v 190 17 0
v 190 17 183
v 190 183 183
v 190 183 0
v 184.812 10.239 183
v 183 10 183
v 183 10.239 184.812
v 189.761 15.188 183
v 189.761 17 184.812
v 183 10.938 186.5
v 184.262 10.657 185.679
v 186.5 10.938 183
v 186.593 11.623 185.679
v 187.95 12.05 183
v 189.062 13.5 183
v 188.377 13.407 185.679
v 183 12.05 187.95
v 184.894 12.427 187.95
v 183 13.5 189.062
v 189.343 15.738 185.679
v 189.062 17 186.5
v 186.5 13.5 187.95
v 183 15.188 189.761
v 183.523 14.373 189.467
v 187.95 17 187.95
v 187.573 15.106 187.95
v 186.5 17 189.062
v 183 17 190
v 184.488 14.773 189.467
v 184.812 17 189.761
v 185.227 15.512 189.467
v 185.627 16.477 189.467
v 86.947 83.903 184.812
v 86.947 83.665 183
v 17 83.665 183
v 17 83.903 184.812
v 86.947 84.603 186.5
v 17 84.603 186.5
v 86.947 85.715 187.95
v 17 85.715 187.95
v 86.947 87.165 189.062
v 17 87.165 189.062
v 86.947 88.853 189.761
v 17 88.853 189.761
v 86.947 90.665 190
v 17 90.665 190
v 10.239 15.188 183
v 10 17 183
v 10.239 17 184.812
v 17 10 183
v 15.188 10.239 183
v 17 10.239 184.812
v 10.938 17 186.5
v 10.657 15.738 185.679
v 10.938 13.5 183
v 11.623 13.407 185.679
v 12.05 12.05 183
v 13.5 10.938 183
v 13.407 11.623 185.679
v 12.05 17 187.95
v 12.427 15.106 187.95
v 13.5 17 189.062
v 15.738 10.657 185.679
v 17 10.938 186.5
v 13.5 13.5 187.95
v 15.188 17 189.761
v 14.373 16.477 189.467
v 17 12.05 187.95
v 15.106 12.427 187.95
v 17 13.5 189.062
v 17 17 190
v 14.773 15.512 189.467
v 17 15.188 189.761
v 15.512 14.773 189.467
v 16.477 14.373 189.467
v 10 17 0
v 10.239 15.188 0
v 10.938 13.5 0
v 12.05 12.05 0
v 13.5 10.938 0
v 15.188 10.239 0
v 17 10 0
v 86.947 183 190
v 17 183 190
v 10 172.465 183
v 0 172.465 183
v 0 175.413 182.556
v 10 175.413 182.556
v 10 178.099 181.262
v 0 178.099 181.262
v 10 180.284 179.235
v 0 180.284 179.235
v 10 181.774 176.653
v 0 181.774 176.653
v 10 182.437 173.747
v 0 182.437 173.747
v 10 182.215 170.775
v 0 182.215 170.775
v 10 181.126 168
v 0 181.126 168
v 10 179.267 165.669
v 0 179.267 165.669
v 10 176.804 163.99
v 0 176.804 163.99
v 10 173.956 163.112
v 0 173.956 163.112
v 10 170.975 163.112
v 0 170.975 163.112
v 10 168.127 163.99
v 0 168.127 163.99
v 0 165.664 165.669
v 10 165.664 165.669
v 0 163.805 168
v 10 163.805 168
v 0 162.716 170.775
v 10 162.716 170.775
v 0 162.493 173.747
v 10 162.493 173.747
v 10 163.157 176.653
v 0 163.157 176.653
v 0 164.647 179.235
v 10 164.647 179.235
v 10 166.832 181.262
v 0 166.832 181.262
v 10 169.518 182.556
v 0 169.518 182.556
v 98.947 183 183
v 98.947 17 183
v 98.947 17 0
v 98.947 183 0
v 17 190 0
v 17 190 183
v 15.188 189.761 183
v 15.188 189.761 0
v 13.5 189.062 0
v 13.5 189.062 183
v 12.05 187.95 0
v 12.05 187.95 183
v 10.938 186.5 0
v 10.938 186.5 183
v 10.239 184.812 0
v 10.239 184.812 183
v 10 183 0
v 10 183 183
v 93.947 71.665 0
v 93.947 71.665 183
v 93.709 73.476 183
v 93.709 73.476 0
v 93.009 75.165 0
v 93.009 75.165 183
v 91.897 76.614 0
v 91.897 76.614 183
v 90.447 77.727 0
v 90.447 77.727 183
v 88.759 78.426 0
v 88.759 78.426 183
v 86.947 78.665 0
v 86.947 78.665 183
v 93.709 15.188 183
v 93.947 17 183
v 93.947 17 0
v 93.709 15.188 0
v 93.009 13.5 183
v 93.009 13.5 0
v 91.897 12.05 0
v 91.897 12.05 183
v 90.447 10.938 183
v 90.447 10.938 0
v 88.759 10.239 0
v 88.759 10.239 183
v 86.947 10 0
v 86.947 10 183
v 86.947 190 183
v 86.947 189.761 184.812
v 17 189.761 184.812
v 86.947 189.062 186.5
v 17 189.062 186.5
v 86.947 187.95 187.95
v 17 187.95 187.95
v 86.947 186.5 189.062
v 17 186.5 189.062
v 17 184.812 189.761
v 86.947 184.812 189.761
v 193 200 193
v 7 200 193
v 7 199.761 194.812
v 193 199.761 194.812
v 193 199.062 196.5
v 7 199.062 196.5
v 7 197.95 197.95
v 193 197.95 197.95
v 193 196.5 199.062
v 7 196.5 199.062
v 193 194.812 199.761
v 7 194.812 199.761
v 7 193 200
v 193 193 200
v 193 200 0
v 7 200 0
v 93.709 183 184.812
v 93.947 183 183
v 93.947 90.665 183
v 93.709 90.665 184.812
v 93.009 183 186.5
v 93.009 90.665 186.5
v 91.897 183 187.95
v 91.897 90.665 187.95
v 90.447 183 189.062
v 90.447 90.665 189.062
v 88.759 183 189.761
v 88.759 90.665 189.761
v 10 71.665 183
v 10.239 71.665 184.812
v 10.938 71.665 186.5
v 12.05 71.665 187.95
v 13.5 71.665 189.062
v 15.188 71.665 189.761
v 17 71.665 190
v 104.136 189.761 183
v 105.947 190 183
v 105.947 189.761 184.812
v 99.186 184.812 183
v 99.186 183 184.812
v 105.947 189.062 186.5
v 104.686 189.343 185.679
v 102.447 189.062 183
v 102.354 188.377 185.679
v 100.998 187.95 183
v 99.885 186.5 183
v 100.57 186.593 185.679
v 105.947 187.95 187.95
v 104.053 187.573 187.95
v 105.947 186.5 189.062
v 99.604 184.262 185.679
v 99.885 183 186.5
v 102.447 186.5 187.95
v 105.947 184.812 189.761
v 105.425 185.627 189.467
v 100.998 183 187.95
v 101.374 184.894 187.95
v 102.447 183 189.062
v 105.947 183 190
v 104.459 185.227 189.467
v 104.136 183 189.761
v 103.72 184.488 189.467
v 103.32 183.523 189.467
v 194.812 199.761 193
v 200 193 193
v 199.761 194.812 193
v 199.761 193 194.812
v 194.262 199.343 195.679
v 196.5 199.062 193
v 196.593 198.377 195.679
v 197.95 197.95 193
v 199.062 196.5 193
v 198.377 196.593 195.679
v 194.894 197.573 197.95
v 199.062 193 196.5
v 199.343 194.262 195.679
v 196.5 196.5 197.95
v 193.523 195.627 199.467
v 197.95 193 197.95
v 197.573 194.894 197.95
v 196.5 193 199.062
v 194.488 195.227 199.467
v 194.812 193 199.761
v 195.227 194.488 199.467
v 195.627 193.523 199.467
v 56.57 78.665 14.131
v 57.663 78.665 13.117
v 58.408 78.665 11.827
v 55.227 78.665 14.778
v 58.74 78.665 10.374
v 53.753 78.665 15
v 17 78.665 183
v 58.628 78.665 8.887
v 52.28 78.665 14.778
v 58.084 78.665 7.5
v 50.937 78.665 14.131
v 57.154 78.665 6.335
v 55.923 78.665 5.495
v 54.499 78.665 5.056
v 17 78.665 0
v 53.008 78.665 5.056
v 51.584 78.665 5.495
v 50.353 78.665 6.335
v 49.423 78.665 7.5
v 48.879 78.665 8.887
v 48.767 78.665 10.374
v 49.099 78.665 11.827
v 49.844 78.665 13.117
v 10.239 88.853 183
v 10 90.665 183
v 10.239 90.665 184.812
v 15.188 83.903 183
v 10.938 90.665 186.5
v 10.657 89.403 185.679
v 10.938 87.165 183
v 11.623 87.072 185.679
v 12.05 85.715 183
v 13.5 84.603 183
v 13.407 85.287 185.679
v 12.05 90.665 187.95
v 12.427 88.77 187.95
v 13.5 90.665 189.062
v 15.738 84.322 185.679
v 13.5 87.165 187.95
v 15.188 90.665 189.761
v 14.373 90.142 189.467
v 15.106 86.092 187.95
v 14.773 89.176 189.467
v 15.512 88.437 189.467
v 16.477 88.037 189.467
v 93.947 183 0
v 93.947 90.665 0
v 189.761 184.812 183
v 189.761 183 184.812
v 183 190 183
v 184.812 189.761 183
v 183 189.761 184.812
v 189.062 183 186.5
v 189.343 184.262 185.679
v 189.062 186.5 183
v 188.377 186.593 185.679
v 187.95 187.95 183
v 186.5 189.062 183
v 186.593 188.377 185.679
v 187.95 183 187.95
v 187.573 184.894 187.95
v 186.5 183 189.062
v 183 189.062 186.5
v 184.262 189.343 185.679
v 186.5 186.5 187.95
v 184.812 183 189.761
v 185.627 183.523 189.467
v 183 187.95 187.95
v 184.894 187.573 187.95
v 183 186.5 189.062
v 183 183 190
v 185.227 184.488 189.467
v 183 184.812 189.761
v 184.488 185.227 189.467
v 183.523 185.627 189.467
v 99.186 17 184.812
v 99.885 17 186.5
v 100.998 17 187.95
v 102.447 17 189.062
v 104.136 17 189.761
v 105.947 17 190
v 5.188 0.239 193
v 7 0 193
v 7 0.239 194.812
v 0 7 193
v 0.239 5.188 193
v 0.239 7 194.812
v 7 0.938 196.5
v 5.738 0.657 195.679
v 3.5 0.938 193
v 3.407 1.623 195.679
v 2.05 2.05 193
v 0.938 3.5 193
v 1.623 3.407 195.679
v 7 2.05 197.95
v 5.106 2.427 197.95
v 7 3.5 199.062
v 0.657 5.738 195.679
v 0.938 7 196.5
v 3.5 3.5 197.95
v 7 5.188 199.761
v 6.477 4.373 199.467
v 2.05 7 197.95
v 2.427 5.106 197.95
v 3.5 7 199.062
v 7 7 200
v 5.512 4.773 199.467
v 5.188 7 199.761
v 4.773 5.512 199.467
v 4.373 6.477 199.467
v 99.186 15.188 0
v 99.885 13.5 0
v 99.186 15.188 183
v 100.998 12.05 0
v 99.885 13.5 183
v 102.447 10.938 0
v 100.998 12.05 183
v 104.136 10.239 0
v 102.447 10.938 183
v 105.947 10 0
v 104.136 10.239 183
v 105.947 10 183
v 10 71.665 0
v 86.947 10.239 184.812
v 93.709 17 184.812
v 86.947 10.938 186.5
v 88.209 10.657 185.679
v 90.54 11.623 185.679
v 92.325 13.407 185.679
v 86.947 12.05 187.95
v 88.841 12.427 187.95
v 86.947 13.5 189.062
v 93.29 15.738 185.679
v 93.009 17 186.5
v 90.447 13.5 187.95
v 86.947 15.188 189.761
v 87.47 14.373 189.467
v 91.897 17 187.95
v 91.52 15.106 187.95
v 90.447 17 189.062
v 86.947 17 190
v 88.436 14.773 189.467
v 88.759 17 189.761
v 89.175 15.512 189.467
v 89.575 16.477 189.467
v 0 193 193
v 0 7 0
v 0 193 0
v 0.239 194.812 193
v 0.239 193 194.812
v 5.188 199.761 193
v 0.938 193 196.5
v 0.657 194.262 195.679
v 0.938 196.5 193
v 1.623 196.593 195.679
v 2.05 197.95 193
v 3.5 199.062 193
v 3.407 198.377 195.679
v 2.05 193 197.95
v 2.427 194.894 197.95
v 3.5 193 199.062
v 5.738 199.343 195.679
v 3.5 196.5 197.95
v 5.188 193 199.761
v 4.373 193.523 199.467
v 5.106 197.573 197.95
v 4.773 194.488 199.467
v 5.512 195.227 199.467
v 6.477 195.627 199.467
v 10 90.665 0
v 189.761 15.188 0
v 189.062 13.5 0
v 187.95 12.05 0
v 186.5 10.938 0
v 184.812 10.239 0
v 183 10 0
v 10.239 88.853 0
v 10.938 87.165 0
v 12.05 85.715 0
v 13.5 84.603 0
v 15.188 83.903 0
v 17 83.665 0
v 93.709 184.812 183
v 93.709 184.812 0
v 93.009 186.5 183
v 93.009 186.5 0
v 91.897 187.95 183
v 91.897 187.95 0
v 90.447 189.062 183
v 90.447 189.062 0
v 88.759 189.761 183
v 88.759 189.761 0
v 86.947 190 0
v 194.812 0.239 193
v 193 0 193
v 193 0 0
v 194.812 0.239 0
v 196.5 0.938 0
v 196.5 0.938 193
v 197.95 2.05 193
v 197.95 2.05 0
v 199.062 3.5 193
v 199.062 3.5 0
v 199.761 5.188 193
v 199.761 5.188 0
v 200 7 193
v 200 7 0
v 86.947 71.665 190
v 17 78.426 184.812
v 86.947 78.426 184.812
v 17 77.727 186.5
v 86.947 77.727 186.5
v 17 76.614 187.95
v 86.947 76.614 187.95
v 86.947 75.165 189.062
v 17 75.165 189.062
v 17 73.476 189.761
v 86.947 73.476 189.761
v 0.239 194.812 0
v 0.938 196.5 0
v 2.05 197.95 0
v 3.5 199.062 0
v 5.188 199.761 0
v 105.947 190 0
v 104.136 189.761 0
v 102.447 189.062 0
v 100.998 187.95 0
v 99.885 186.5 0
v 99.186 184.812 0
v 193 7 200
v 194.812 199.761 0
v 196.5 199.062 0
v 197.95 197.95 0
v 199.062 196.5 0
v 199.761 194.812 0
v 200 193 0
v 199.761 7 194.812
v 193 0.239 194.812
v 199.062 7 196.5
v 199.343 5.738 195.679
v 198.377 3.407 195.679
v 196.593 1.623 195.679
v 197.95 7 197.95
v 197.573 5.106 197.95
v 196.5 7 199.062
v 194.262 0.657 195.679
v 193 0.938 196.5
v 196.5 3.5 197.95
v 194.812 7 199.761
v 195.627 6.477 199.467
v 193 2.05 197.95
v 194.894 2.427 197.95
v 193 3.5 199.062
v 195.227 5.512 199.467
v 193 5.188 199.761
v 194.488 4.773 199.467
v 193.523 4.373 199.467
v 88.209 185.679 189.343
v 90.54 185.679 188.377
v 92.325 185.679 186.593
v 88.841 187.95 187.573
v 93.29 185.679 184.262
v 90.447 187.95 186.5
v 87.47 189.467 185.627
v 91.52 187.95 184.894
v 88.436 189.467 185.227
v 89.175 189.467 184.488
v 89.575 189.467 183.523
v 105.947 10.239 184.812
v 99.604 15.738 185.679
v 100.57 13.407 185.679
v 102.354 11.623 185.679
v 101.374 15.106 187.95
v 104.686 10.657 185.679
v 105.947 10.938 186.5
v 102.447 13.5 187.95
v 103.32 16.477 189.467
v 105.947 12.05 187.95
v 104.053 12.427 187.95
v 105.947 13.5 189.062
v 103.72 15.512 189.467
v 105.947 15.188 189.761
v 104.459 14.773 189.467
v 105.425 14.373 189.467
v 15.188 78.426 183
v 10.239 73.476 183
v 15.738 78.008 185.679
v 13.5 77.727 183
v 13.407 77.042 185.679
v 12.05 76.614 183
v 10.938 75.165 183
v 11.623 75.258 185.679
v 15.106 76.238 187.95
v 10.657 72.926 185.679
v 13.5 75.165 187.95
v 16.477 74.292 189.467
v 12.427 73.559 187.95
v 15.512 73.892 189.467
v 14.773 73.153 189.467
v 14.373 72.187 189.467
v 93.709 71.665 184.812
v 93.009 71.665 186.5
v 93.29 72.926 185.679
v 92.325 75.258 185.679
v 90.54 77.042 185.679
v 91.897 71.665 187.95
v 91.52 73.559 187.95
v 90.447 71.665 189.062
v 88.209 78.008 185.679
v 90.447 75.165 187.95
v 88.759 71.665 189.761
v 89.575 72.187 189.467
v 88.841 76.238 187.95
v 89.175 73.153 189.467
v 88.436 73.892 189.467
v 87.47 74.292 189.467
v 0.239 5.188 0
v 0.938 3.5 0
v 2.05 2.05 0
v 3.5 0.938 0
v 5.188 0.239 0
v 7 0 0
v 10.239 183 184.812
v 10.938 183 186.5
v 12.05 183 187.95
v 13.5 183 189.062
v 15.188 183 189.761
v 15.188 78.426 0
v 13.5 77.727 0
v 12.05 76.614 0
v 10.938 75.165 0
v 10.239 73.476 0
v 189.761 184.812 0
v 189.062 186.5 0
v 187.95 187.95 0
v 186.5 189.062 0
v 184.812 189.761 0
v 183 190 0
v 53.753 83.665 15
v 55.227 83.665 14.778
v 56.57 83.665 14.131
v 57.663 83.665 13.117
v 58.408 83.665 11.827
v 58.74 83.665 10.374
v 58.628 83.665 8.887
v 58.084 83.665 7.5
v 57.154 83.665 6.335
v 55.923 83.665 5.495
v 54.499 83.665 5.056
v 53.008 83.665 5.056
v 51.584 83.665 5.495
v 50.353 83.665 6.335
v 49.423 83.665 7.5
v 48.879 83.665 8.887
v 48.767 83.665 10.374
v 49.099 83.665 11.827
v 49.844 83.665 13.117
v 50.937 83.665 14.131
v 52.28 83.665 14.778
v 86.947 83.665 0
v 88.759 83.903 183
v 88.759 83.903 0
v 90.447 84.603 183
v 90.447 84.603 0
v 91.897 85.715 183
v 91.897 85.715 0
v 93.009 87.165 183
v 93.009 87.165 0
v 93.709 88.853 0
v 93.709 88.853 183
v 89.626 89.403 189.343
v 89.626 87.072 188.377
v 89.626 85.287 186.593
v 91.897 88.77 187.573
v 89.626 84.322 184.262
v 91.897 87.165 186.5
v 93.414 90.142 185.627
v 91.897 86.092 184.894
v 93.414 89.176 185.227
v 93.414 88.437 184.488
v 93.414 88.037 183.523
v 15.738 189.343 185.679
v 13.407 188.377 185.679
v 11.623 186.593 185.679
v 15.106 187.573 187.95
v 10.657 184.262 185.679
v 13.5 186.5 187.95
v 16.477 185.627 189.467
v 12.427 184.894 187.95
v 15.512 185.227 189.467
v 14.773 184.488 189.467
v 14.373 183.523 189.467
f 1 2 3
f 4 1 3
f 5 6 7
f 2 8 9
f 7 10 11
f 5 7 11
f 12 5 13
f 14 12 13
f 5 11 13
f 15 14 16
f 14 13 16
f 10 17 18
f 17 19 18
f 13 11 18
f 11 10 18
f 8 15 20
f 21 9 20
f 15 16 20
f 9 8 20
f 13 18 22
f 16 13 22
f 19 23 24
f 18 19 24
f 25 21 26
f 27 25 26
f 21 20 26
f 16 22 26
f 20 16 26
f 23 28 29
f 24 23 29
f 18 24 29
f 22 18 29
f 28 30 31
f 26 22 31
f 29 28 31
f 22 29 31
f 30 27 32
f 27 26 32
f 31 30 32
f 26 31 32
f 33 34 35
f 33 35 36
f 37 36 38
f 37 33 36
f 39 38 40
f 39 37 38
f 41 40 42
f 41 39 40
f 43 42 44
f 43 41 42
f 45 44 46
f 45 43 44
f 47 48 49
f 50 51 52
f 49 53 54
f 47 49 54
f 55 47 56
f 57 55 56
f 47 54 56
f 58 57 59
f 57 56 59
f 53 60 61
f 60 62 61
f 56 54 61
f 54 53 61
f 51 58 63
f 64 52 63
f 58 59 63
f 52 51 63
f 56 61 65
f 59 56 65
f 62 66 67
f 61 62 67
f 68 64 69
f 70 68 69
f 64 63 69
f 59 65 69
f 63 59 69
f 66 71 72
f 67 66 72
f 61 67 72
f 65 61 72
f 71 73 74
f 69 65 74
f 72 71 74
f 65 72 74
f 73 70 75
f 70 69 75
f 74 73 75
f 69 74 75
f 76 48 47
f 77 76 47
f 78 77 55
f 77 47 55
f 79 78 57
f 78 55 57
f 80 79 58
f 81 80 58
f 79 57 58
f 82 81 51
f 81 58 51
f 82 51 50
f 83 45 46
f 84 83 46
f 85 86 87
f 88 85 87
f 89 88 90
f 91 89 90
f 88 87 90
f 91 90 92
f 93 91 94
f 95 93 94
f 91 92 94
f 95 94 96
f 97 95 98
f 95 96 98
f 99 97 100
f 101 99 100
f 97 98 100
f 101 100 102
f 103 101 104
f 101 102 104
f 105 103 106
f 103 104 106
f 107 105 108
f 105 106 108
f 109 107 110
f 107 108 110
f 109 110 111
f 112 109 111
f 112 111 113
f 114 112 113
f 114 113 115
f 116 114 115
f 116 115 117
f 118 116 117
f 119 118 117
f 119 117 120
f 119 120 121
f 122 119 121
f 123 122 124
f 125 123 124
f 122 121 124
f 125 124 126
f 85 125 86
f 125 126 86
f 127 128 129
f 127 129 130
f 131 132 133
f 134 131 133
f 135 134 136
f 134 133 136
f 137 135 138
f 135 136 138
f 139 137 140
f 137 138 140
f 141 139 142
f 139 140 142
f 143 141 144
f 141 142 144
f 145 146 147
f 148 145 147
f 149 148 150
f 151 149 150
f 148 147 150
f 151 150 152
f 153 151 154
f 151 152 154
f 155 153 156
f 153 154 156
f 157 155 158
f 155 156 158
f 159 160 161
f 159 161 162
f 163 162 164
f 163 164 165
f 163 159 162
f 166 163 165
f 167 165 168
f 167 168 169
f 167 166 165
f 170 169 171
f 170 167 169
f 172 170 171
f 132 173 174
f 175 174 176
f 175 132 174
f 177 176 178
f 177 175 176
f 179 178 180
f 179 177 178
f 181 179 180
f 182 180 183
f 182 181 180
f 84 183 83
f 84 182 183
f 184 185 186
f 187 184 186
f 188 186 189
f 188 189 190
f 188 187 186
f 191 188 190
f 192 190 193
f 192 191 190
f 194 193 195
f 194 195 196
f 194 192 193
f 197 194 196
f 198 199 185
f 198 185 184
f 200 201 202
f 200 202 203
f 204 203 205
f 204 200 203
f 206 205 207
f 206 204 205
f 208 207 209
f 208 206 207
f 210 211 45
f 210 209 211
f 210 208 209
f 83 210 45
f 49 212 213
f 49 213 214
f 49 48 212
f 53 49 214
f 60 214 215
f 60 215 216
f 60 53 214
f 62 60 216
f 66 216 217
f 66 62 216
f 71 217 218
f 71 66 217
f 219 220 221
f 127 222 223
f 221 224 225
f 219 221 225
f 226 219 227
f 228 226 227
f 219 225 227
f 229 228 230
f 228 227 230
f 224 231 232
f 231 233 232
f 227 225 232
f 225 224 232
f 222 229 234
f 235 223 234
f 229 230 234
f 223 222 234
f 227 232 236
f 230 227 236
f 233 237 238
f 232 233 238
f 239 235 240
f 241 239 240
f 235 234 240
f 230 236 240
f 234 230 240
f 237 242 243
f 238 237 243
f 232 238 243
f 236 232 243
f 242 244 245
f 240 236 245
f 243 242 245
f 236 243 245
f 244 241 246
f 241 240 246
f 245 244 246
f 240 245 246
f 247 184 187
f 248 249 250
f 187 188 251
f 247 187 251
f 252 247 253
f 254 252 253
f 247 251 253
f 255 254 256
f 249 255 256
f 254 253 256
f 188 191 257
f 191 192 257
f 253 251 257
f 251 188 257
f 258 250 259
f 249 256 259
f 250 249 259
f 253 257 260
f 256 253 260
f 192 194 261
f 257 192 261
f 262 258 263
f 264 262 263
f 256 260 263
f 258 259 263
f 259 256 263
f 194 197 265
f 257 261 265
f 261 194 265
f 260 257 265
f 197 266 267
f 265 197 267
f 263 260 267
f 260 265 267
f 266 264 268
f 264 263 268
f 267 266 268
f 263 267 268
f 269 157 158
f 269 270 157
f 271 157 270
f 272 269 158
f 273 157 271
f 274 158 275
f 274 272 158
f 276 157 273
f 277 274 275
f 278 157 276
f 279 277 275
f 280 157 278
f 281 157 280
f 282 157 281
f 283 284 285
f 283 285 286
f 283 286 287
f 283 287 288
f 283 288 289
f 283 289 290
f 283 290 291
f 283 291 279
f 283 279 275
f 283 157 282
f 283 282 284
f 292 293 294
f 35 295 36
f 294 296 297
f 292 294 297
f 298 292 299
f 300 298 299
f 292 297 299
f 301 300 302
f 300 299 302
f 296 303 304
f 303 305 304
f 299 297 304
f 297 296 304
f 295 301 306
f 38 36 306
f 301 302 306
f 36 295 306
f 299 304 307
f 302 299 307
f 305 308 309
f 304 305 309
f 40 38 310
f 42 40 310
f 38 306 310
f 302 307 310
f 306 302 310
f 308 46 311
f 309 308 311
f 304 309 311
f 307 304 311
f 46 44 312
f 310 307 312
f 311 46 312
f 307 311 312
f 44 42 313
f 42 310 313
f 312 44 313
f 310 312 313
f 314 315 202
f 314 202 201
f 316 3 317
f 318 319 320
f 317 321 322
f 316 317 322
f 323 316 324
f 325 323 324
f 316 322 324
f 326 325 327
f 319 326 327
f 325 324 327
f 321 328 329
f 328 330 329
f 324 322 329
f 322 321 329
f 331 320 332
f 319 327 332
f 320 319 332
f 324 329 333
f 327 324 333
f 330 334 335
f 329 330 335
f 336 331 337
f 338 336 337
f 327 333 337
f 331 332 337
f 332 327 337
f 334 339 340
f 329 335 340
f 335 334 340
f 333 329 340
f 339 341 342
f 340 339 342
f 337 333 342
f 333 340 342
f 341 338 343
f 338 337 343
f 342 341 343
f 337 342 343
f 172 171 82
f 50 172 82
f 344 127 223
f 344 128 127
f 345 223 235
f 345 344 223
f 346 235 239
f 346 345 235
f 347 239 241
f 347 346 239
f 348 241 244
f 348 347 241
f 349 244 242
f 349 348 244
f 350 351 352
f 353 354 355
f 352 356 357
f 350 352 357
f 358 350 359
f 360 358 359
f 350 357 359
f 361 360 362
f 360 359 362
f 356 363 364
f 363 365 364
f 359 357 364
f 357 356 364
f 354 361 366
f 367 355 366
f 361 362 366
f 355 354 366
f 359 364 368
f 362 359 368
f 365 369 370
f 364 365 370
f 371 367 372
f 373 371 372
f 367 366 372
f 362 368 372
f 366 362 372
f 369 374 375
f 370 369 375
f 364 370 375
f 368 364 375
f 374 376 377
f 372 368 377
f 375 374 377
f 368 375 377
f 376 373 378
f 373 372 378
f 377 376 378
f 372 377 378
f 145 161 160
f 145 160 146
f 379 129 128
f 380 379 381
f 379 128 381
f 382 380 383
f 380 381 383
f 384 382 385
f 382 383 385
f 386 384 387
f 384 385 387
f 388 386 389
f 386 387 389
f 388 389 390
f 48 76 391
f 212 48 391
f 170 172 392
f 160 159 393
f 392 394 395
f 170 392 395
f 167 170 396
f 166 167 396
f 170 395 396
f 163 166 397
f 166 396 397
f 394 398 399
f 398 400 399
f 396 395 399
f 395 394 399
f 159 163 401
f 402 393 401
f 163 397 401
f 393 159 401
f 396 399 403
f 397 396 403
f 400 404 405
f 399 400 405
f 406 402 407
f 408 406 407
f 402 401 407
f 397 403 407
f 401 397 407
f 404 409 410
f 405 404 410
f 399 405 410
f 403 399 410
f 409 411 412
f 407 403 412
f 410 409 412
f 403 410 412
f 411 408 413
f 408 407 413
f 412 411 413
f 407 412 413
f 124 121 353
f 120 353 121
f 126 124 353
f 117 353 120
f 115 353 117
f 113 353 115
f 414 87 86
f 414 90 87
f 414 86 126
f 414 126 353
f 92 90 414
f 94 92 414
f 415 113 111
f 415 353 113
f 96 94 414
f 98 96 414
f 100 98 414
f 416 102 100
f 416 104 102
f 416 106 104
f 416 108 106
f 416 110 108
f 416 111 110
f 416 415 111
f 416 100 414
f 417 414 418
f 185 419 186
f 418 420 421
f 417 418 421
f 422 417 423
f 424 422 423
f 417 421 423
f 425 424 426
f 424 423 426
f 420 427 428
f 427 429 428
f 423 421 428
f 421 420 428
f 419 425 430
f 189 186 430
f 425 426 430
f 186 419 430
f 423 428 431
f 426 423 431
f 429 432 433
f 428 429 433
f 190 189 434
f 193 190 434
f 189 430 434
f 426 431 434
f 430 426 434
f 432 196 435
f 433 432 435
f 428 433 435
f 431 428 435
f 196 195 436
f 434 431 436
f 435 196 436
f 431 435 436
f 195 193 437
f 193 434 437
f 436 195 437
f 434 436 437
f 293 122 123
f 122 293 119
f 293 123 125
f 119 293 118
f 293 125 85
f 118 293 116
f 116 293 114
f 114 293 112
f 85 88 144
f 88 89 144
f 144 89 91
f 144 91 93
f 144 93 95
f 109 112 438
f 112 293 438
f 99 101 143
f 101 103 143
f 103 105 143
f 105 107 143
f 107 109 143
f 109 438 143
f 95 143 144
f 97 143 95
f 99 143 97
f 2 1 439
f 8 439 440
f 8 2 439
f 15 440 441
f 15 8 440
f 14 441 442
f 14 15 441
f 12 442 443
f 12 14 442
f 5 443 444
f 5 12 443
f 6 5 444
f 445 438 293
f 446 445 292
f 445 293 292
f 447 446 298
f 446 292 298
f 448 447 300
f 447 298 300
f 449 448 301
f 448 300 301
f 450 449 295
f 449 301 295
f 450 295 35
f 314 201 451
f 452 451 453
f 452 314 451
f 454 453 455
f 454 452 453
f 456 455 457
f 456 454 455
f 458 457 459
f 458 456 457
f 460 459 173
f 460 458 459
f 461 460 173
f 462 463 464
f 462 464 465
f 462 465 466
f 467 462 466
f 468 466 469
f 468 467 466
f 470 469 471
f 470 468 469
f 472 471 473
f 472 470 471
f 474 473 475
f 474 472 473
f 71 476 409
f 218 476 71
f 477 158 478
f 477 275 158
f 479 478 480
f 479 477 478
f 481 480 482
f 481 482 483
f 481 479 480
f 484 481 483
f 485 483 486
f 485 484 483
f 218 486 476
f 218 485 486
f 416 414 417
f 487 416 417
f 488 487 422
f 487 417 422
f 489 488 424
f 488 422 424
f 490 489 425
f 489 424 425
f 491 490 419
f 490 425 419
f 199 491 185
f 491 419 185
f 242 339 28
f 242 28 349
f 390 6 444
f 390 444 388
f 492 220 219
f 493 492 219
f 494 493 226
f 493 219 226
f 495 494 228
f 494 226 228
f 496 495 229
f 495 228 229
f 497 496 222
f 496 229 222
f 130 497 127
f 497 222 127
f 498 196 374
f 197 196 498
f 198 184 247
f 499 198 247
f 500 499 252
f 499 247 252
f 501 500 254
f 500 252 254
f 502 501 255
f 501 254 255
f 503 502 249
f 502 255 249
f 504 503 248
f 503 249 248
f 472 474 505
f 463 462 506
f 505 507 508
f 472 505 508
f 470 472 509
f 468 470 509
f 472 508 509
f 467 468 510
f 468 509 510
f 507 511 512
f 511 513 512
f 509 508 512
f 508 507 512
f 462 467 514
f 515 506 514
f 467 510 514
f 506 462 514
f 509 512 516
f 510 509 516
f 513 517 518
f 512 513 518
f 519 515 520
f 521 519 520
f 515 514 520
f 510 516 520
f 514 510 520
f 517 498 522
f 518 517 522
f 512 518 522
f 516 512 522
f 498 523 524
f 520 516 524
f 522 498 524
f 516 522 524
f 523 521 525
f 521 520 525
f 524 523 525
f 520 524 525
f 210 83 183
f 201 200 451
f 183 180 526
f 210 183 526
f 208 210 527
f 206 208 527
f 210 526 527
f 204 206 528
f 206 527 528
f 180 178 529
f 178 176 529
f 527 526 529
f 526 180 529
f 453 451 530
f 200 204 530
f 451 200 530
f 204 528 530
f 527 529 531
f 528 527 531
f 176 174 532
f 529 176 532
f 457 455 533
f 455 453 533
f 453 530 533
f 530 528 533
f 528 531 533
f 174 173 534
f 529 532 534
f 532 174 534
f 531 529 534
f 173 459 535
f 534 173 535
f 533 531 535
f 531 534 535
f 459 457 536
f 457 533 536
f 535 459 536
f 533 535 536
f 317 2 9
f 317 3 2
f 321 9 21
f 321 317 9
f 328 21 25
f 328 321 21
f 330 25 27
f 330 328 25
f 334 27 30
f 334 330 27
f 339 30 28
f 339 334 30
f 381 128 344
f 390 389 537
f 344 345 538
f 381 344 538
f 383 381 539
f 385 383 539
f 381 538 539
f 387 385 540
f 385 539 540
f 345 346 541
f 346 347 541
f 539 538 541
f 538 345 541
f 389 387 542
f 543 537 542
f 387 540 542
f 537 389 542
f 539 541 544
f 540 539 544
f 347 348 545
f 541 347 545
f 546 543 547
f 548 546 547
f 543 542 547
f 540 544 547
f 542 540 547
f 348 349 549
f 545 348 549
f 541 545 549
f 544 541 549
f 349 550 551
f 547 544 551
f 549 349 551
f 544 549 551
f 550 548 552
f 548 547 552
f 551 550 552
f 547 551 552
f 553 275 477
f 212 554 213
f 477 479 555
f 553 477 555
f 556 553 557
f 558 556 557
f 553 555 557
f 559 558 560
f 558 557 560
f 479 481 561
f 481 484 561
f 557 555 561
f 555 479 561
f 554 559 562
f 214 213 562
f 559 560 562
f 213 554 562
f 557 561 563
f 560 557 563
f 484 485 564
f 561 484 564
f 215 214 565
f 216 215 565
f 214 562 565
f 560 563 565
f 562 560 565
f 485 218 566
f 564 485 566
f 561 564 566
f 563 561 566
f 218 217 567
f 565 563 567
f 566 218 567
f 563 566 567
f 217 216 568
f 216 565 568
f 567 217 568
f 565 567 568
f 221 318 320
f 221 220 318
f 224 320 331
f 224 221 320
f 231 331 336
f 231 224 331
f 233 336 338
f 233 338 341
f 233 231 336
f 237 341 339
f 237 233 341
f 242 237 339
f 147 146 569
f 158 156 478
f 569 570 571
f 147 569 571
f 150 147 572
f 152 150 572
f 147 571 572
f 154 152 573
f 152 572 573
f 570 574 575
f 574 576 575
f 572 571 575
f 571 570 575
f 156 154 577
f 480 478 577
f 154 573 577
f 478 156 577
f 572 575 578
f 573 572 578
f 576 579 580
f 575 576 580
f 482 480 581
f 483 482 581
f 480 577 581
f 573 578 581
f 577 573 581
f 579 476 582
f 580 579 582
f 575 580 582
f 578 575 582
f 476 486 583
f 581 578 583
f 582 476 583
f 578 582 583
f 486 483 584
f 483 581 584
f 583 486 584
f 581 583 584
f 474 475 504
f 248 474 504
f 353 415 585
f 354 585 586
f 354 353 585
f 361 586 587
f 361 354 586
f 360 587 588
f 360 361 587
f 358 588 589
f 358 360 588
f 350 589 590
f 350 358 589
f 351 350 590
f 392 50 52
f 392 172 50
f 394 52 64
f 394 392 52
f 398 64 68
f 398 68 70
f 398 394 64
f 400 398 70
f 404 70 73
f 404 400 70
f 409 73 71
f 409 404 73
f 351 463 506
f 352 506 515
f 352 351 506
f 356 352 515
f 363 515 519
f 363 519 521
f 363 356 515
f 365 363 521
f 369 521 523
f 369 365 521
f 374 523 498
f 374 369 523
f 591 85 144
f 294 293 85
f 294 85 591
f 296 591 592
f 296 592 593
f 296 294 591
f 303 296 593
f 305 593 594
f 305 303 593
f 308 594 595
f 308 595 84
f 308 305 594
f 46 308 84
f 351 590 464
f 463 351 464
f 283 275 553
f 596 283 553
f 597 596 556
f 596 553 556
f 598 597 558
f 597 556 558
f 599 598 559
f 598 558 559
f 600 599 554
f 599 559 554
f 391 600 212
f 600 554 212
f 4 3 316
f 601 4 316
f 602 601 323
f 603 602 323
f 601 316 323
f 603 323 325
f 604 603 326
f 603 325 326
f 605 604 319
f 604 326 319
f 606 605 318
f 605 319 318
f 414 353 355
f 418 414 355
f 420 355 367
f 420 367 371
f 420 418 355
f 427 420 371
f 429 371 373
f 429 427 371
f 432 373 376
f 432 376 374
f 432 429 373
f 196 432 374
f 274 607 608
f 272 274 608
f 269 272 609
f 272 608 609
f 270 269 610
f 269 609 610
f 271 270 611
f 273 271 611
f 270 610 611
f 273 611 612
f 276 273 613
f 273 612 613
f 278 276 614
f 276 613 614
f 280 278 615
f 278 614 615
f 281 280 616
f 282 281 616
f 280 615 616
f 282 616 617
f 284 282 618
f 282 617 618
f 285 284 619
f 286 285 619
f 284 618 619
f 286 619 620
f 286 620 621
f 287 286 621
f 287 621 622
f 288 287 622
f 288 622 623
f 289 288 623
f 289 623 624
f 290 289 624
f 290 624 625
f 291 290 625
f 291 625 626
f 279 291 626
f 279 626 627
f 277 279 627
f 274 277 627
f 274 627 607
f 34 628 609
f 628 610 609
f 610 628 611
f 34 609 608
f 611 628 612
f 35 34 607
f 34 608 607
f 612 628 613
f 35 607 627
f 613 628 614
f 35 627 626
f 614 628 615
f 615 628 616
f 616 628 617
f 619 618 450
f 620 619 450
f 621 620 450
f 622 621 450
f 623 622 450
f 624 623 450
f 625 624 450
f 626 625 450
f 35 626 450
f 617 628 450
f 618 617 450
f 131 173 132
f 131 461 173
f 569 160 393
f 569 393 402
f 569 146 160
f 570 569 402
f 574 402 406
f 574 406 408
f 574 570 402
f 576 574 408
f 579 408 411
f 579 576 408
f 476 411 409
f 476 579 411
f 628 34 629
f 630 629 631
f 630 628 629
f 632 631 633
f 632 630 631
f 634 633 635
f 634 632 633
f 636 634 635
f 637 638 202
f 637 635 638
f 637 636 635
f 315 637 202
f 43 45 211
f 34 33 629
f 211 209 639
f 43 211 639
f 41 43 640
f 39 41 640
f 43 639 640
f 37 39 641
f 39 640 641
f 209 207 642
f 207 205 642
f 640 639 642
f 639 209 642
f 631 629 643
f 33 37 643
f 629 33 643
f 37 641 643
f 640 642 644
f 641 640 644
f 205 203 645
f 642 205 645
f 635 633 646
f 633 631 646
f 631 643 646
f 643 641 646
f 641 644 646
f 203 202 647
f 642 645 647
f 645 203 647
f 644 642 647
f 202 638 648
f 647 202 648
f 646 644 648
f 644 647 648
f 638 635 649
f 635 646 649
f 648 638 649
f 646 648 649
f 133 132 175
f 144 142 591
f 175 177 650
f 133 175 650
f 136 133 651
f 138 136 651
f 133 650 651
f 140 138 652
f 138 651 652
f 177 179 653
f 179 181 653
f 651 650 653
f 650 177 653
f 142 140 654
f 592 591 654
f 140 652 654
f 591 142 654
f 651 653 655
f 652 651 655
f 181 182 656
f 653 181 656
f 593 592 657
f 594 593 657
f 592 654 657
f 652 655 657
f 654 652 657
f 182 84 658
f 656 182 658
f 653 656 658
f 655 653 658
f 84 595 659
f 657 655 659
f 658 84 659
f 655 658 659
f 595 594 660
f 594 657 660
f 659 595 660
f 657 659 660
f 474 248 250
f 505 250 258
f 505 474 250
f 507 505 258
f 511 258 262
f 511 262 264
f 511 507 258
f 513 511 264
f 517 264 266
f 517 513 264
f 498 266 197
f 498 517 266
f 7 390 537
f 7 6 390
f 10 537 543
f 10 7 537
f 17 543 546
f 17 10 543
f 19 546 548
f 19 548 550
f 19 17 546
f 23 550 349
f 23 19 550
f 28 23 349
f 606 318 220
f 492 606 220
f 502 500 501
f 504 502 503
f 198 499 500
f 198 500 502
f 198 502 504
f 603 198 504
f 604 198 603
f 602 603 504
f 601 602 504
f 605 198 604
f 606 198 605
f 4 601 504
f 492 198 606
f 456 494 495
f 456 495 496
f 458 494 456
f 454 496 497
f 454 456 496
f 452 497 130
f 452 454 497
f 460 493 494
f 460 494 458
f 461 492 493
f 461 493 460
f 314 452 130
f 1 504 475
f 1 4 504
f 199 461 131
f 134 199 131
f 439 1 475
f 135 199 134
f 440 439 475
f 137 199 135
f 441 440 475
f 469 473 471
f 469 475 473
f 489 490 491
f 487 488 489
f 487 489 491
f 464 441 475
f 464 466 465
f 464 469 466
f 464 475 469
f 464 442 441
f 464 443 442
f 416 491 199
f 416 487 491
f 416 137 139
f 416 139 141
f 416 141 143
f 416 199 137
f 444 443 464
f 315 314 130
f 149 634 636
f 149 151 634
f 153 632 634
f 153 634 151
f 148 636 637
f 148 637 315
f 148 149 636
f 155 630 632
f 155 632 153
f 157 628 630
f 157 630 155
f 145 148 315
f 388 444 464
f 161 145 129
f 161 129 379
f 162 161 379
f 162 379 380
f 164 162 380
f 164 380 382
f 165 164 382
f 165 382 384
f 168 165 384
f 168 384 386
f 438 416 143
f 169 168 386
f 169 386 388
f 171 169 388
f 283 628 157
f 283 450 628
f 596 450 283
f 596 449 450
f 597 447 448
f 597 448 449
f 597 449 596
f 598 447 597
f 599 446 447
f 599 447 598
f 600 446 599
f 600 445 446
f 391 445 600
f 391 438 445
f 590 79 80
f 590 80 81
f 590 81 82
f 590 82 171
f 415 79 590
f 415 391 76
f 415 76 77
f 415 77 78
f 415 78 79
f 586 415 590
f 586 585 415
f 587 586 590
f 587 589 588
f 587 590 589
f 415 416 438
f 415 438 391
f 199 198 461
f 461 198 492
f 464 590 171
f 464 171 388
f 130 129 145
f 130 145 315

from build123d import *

# Parameters (mm, degrees)
ESBO_O1_W                = 200
ESBO_O1_H                = 200
RESSALTO_EXTRUS_O2_DEPTH = 200
ESBO_O4_W                = 91.052715104
ESBO_O4_H                = 180
ESBO_O4_W_2              = 83.947284896
ESBO_O4_H_2              = 68.664679647
ESBO_O4_H_3              = 106.335320353
CORTE_EXTRUS_O2_DEPTH    = 190
FILETE2_R                = 7
FILETE3_R                = 7
FILETE4_R                = 7
FILETE5_R                = 7
FILETE6_R                = 7
ESBO_O5_R                = 5
CORTE_EXTRUS_O3_DEPTH    = 10
ESBO_O6_R                = 10
CORTE_EXTRUS_O4_DEPTH    = 10


with BuildPart() as part:
    # Esboço1 → Ressalto-extrusão2 (new body)
    with BuildSketch(Plane.XY):
        with Locations((100, 100)):
            Rectangle(ESBO_O1_W, ESBO_O1_H)
    extrude(amount=RESSALTO_EXTRUS_O2_DEPTH)

    # Esboço4 → Corte-extrusão2 (cut)
    with BuildSketch(Plane(origin=(0, 0, 0), x_dir=(-1, 0, 0), z_dir=(0, 0, -1))):
        with Locations((-144.473642448, 100)):
            Rectangle(ESBO_O4_W, ESBO_O4_H)
        with Locations((-51.973642448, 44.332339823)):
            Rectangle(ESBO_O4_W_2, ESBO_O4_H_2)
        with Locations((-51.973642448, 136.832339824)):
            Rectangle(ESBO_O4_W_2, ESBO_O4_H_3)
    extrude(amount=-CORTE_EXTRUS_O2_DEPTH, mode=Mode.SUBTRACT)

    # Filete2
    filete2_edges = [part.edges().sort_by_distance(p)[0] for p in [
        (0, 0, 100),
        (0, 200, 100),
        (200, 200, 100),
        (200, 0, 100),
    ]]
    fillet(filete2_edges, radius=FILETE2_R)

    # Filete3
    filete3_edges = [part.edges().sort_by_distance(p)[0] for p in [
        (190, 10, 95),
        (190, 190, 95),
        (98.947284896, 190, 95),
        (98.947284896, 10, 95),
        (93.947284896, 10, 95),
        (93.947284896, 78.664679647, 95),
        (10, 78.664679647, 95),
        (10, 10, 95),
        (10, 190, 95),
        (10, 83.664679647, 95),
    ]]
    fillet(filete3_edges, radius=FILETE3_R)

    # Filete4
    filete4_edges = [part.edges().sort_by_distance(p)[0] for p in [
        (12.050252532, 187.949747468, 190),
        (12.050252532, 85.714932179, 190),
        (93.947284896, 136.832339824, 190),
        (55.473642448, 83.664679647, 190),
        (93.947284896, 44.332339824, 190),
        (51.973642448, 78.664679647, 190),
        (51.973642448, 10, 190),
        (10, 44.332339824, 190),
        (12.050252532, 12.050252532, 190),
        (12.050252532, 76.614427115, 190),
        (91.897032365, 12.050252532, 190),
        (91.897032365, 76.614427115, 190),
        (190, 100, 190),
        (144.473642448, 190, 190),
        (144.473642448, 10, 190),
        (98.947284896, 100, 190),
        (100.997537428, 187.949747468, 190),
        (100.997537428, 12.050252532, 190),
        (187.949747468, 12.050252532, 190),
        (187.949747468, 187.949747468, 190),
        (10, 136.832339824, 190),
        (55.473642448, 190, 190),
    ]]
    fillet(filete4_edges, radius=FILETE4_R)

    # Filete5
    filete5_edges = [part.edges().sort_by_distance(p)[0] for p in [
        (0, 100, 200),
        (100, 200, 200),
        (100, 0, 200),
        (200, 100, 200),
        (197.949747468, 2.050252532, 200),
        (2.050252532, 2.050252532, 200),
        (197.949747468, 197.949747468, 200),
        (2.050252532, 197.949747468, 200),
    ]]
    fillet(filete5_edges, radius=FILETE5_R)

    # Filete6
    # the kernel refuses this fillet: 7 mm, written as the material it adds along each edge
    with BuildSketch(Plane(origin=(86.947284896, 183, 183), x_dir=(1, 0, 0), z_dir=(0, 1, 0))) as filete6_piece_1_section:
        Polygon((0, 0), (FILETE6_R * 1.02, 0), (FILETE6_R * 1.02, -FILETE6_R * 1.02), (0, -FILETE6_R * 1.02), align=None)
    filete6_piece_1 = extrude(amount=FILETE6_R * 1.02, mode=Mode.PRIVATE)
    filete6_piece_1 = filete6_piece_1 - Plane(origin=(86.947284896, 183, 183), x_dir=(-0.7071067811865475, 0, -0.7071067811865475), z_dir=(0, 1, 0)) * Sphere(FILETE6_R, mode=Mode.PRIVATE)
    add(filete6_piece_1)
    with BuildSketch(Plane(origin=(86.947284896, 90.664679647, 183), x_dir=(0, -1, 0), z_dir=(1, 0, 0))) as filete6_piece_2_section:
        Polygon((0, 0), (FILETE6_R * 1.02, 0), (FILETE6_R * 1.02, -FILETE6_R * 1.02), (0, -FILETE6_R * 1.02), align=None)
    filete6_piece_2 = extrude(amount=FILETE6_R * 1.02, mode=Mode.PRIVATE)
    filete6_piece_2 = filete6_piece_2 - Plane(origin=(86.947284896, 90.664679647, 183), x_dir=(0, 0.7071067811865475, -0.7071067811865475), z_dir=(1, 0, 0)) * Sphere(FILETE6_R, mode=Mode.PRIVATE)
    add(filete6_piece_2)
    with BuildSketch(Plane(origin=(93.947284896, 83.664679647, 0), x_dir=(0, 1, 0), z_dir=(0, 0, 1)), Plane(origin=(93.947284896, 190, 0), x_dir=(-1, 0, 0), z_dir=(0, 0, 1))) as filete6_piece_3:
        with BuildLine():
            CenterArc((FILETE6_R, FILETE6_R), FILETE6_R, 180, 90)
            Line((0, FILETE6_R), (0, 0))
            Line((0, 0), (FILETE6_R, 0))
        make_face()
    extrude(amount=183)

    # Esboço5 → Corte-extrusão3 (cut)
    with BuildSketch(Plane(origin=(0, 83.664679647, 0), x_dir=(1, 0, 0), z_dir=(0, 1, 0))):
        with Locations(Location((53.753482912, -10, 0), (0, 0, 270))):
            Circle(ESBO_O5_R)
    extrude(amount=-CORTE_EXTRUS_O3_DEPTH, mode=Mode.SUBTRACT)

    # Esboço6 → Corte-extrusão4 (cut)
    with BuildSketch(Plane.ZY):
        with Locations((173, 172.46544245)):
            Circle(ESBO_O6_R)
    extrude(amount=-CORTE_EXTRUS_O4_DEPTH, mode=Mode.SUBTRACT)


solid = part.part
